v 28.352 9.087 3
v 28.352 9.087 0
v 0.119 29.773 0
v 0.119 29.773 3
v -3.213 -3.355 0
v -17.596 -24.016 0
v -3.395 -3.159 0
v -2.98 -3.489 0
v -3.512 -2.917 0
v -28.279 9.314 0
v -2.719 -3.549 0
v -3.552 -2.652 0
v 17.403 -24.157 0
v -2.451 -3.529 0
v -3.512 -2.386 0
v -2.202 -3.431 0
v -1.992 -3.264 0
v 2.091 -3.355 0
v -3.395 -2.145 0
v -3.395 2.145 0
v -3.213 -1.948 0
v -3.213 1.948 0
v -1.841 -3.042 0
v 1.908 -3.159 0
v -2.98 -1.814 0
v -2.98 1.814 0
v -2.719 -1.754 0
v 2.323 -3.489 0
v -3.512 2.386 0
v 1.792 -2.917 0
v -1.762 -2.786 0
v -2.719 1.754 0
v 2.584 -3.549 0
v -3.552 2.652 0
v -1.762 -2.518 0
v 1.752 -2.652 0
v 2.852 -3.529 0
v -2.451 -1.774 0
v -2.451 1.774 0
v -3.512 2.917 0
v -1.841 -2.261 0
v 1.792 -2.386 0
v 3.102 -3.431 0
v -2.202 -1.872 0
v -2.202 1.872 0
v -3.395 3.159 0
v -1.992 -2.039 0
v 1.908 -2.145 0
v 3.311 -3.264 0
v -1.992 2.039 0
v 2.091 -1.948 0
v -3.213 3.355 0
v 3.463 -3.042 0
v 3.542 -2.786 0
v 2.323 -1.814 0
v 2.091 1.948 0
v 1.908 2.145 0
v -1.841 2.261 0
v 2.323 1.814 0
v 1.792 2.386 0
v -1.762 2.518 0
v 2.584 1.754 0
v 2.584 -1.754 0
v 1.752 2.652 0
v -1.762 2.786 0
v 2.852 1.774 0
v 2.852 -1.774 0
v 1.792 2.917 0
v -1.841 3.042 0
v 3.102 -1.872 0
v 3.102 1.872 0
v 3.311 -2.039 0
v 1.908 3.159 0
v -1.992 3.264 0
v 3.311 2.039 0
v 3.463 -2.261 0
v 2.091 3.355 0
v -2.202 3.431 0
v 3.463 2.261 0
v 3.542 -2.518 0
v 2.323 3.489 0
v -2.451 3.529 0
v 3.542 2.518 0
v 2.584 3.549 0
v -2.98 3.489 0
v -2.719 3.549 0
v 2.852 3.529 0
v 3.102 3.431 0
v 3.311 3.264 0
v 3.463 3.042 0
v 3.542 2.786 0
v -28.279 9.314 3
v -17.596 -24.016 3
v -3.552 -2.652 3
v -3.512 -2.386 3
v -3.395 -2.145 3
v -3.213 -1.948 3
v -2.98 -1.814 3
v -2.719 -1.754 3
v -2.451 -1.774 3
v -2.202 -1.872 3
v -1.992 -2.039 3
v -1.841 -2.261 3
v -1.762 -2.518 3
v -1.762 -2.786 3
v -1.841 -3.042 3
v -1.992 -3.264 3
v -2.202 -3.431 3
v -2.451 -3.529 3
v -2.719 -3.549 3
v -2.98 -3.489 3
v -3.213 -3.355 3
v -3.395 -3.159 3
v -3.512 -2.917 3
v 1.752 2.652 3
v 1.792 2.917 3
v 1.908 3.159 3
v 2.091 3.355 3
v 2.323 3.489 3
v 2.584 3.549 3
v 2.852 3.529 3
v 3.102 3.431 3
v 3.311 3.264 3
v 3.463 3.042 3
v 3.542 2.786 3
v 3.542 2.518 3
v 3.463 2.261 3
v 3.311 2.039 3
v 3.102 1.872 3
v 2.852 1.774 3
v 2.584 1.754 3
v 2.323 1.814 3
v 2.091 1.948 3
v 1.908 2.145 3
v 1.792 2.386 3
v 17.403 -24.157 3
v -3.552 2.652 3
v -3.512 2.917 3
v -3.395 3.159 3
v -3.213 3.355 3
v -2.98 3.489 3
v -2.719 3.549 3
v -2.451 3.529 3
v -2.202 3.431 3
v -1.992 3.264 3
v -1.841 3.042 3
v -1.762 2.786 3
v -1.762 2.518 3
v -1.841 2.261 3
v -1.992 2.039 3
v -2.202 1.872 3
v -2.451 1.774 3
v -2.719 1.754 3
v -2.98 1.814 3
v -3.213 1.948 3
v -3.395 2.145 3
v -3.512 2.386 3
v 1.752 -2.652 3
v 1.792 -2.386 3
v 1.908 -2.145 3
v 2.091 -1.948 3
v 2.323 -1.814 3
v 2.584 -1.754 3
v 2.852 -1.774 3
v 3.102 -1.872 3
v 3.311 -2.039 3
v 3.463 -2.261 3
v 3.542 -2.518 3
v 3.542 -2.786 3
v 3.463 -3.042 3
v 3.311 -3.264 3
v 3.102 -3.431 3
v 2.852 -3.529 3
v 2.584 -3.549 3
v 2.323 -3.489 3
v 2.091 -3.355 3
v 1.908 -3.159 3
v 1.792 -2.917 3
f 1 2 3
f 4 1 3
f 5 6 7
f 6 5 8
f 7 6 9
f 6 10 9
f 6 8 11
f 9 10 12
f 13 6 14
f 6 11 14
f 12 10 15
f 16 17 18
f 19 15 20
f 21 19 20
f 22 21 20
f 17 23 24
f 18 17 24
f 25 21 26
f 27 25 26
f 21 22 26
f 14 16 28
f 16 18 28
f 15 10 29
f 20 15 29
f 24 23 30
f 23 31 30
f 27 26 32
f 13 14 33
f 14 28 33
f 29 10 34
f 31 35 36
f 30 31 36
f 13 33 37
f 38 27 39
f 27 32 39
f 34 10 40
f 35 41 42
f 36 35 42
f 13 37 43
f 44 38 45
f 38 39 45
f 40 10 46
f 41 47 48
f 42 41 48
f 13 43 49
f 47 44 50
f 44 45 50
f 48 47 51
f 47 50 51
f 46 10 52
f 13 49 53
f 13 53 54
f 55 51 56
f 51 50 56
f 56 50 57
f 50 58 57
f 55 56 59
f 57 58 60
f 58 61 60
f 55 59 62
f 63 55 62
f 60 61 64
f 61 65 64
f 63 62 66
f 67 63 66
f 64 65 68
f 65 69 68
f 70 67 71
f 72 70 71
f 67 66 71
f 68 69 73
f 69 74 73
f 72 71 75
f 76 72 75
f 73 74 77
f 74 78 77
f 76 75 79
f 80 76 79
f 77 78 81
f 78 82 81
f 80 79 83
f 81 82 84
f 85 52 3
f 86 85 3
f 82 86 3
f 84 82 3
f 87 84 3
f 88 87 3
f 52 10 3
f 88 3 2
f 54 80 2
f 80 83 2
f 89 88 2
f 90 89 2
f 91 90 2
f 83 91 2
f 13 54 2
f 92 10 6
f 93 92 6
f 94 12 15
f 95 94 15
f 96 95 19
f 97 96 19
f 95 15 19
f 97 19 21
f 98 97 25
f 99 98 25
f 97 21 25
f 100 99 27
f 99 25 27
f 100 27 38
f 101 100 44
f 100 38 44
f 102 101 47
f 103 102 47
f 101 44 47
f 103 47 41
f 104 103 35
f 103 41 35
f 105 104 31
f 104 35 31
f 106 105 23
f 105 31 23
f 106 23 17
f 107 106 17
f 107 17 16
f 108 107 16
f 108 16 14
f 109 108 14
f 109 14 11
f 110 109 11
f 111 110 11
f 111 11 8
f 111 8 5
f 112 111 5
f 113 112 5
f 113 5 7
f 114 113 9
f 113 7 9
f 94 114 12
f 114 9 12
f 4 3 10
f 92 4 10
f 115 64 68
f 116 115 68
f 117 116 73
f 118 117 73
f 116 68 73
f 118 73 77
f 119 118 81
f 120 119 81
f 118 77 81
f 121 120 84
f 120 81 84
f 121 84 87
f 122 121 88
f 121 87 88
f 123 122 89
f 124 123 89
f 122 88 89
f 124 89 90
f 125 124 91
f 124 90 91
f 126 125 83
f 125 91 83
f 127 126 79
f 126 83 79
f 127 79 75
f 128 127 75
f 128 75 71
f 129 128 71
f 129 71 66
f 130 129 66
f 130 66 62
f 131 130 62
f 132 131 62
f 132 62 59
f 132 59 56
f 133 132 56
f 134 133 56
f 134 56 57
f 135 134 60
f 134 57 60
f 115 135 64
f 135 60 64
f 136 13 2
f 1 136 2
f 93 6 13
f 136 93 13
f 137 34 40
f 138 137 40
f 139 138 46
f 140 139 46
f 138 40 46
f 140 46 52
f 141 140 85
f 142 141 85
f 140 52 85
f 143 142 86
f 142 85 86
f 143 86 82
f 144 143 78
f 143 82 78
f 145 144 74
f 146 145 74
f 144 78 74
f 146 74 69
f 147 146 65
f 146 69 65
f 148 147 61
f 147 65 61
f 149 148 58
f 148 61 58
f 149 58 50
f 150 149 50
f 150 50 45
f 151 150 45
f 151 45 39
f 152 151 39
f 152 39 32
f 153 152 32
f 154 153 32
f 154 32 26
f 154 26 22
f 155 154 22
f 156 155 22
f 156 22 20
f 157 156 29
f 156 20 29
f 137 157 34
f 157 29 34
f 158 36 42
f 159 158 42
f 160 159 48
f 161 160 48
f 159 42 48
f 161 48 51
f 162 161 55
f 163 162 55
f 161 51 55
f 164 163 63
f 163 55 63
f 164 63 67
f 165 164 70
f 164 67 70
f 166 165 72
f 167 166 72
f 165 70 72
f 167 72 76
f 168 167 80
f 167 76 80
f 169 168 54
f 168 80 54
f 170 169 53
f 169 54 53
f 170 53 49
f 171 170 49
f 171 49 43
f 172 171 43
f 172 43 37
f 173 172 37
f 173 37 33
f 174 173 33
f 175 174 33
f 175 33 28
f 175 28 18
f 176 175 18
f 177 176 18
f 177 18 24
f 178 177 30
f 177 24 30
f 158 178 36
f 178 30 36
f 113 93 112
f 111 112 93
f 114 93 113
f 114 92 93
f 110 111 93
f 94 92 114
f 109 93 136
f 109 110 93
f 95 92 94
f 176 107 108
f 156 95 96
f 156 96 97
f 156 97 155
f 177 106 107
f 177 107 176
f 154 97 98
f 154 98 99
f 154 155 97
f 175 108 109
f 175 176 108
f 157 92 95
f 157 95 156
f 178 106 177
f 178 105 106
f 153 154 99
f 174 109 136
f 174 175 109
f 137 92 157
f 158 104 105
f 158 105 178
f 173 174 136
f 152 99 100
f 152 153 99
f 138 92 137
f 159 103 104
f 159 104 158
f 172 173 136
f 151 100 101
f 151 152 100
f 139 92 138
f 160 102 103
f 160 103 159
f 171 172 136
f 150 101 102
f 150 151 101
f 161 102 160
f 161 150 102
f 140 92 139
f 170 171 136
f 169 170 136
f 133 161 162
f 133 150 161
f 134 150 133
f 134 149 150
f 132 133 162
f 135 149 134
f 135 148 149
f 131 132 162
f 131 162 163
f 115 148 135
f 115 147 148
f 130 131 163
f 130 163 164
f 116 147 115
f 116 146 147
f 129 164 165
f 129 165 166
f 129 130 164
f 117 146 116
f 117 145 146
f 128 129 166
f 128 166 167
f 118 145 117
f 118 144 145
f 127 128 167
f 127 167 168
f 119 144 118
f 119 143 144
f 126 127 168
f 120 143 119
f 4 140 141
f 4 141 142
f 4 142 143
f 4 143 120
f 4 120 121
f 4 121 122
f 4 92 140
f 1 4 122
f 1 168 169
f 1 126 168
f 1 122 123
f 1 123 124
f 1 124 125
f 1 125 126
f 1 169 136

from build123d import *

# Parameters (mm, degrees)
BOSS_EXTRUDE1_DEPTH = 3
SKETCH2_R           = 0.9
CUT_EXTRUDE1_DEPTH  = 3


with BuildPart() as part:
    # Sketch1 → Boss-Extrude1 (new body)
    with BuildSketch(Plane.XY):
        Polygon((-17.596228945, -24.016474641), (17.403490925, -24.156507009), (28.352177859, 9.08693226), (0.119118647, 29.772539999), (-28.278558486, 9.313509391), align=None)
    extrude(amount=BOSS_EXTRUDE1_DEPTH)

    # Sketch2 → Cut-Extrude1 (cut)
    with BuildSketch(Plane(origin=(0, 0, 0), x_dir=(-1, 0, 0), z_dir=(0, 0, -1))):
        with Locations((2.651650429, -2.651650429)):
            Circle(SKETCH2_R)
        with Locations((-2.651650429, -2.651650429)):
            Circle(SKETCH2_R)
        with Locations((-2.651650429, 2.651650429)):
            Circle(SKETCH2_R)
        with Locations((2.651650429, 2.651650429)):
            Circle(SKETCH2_R)
    extrude(amount=-CUT_EXTRUDE1_DEPTH, mode=Mode.SUBTRACT)


solid = part.part
